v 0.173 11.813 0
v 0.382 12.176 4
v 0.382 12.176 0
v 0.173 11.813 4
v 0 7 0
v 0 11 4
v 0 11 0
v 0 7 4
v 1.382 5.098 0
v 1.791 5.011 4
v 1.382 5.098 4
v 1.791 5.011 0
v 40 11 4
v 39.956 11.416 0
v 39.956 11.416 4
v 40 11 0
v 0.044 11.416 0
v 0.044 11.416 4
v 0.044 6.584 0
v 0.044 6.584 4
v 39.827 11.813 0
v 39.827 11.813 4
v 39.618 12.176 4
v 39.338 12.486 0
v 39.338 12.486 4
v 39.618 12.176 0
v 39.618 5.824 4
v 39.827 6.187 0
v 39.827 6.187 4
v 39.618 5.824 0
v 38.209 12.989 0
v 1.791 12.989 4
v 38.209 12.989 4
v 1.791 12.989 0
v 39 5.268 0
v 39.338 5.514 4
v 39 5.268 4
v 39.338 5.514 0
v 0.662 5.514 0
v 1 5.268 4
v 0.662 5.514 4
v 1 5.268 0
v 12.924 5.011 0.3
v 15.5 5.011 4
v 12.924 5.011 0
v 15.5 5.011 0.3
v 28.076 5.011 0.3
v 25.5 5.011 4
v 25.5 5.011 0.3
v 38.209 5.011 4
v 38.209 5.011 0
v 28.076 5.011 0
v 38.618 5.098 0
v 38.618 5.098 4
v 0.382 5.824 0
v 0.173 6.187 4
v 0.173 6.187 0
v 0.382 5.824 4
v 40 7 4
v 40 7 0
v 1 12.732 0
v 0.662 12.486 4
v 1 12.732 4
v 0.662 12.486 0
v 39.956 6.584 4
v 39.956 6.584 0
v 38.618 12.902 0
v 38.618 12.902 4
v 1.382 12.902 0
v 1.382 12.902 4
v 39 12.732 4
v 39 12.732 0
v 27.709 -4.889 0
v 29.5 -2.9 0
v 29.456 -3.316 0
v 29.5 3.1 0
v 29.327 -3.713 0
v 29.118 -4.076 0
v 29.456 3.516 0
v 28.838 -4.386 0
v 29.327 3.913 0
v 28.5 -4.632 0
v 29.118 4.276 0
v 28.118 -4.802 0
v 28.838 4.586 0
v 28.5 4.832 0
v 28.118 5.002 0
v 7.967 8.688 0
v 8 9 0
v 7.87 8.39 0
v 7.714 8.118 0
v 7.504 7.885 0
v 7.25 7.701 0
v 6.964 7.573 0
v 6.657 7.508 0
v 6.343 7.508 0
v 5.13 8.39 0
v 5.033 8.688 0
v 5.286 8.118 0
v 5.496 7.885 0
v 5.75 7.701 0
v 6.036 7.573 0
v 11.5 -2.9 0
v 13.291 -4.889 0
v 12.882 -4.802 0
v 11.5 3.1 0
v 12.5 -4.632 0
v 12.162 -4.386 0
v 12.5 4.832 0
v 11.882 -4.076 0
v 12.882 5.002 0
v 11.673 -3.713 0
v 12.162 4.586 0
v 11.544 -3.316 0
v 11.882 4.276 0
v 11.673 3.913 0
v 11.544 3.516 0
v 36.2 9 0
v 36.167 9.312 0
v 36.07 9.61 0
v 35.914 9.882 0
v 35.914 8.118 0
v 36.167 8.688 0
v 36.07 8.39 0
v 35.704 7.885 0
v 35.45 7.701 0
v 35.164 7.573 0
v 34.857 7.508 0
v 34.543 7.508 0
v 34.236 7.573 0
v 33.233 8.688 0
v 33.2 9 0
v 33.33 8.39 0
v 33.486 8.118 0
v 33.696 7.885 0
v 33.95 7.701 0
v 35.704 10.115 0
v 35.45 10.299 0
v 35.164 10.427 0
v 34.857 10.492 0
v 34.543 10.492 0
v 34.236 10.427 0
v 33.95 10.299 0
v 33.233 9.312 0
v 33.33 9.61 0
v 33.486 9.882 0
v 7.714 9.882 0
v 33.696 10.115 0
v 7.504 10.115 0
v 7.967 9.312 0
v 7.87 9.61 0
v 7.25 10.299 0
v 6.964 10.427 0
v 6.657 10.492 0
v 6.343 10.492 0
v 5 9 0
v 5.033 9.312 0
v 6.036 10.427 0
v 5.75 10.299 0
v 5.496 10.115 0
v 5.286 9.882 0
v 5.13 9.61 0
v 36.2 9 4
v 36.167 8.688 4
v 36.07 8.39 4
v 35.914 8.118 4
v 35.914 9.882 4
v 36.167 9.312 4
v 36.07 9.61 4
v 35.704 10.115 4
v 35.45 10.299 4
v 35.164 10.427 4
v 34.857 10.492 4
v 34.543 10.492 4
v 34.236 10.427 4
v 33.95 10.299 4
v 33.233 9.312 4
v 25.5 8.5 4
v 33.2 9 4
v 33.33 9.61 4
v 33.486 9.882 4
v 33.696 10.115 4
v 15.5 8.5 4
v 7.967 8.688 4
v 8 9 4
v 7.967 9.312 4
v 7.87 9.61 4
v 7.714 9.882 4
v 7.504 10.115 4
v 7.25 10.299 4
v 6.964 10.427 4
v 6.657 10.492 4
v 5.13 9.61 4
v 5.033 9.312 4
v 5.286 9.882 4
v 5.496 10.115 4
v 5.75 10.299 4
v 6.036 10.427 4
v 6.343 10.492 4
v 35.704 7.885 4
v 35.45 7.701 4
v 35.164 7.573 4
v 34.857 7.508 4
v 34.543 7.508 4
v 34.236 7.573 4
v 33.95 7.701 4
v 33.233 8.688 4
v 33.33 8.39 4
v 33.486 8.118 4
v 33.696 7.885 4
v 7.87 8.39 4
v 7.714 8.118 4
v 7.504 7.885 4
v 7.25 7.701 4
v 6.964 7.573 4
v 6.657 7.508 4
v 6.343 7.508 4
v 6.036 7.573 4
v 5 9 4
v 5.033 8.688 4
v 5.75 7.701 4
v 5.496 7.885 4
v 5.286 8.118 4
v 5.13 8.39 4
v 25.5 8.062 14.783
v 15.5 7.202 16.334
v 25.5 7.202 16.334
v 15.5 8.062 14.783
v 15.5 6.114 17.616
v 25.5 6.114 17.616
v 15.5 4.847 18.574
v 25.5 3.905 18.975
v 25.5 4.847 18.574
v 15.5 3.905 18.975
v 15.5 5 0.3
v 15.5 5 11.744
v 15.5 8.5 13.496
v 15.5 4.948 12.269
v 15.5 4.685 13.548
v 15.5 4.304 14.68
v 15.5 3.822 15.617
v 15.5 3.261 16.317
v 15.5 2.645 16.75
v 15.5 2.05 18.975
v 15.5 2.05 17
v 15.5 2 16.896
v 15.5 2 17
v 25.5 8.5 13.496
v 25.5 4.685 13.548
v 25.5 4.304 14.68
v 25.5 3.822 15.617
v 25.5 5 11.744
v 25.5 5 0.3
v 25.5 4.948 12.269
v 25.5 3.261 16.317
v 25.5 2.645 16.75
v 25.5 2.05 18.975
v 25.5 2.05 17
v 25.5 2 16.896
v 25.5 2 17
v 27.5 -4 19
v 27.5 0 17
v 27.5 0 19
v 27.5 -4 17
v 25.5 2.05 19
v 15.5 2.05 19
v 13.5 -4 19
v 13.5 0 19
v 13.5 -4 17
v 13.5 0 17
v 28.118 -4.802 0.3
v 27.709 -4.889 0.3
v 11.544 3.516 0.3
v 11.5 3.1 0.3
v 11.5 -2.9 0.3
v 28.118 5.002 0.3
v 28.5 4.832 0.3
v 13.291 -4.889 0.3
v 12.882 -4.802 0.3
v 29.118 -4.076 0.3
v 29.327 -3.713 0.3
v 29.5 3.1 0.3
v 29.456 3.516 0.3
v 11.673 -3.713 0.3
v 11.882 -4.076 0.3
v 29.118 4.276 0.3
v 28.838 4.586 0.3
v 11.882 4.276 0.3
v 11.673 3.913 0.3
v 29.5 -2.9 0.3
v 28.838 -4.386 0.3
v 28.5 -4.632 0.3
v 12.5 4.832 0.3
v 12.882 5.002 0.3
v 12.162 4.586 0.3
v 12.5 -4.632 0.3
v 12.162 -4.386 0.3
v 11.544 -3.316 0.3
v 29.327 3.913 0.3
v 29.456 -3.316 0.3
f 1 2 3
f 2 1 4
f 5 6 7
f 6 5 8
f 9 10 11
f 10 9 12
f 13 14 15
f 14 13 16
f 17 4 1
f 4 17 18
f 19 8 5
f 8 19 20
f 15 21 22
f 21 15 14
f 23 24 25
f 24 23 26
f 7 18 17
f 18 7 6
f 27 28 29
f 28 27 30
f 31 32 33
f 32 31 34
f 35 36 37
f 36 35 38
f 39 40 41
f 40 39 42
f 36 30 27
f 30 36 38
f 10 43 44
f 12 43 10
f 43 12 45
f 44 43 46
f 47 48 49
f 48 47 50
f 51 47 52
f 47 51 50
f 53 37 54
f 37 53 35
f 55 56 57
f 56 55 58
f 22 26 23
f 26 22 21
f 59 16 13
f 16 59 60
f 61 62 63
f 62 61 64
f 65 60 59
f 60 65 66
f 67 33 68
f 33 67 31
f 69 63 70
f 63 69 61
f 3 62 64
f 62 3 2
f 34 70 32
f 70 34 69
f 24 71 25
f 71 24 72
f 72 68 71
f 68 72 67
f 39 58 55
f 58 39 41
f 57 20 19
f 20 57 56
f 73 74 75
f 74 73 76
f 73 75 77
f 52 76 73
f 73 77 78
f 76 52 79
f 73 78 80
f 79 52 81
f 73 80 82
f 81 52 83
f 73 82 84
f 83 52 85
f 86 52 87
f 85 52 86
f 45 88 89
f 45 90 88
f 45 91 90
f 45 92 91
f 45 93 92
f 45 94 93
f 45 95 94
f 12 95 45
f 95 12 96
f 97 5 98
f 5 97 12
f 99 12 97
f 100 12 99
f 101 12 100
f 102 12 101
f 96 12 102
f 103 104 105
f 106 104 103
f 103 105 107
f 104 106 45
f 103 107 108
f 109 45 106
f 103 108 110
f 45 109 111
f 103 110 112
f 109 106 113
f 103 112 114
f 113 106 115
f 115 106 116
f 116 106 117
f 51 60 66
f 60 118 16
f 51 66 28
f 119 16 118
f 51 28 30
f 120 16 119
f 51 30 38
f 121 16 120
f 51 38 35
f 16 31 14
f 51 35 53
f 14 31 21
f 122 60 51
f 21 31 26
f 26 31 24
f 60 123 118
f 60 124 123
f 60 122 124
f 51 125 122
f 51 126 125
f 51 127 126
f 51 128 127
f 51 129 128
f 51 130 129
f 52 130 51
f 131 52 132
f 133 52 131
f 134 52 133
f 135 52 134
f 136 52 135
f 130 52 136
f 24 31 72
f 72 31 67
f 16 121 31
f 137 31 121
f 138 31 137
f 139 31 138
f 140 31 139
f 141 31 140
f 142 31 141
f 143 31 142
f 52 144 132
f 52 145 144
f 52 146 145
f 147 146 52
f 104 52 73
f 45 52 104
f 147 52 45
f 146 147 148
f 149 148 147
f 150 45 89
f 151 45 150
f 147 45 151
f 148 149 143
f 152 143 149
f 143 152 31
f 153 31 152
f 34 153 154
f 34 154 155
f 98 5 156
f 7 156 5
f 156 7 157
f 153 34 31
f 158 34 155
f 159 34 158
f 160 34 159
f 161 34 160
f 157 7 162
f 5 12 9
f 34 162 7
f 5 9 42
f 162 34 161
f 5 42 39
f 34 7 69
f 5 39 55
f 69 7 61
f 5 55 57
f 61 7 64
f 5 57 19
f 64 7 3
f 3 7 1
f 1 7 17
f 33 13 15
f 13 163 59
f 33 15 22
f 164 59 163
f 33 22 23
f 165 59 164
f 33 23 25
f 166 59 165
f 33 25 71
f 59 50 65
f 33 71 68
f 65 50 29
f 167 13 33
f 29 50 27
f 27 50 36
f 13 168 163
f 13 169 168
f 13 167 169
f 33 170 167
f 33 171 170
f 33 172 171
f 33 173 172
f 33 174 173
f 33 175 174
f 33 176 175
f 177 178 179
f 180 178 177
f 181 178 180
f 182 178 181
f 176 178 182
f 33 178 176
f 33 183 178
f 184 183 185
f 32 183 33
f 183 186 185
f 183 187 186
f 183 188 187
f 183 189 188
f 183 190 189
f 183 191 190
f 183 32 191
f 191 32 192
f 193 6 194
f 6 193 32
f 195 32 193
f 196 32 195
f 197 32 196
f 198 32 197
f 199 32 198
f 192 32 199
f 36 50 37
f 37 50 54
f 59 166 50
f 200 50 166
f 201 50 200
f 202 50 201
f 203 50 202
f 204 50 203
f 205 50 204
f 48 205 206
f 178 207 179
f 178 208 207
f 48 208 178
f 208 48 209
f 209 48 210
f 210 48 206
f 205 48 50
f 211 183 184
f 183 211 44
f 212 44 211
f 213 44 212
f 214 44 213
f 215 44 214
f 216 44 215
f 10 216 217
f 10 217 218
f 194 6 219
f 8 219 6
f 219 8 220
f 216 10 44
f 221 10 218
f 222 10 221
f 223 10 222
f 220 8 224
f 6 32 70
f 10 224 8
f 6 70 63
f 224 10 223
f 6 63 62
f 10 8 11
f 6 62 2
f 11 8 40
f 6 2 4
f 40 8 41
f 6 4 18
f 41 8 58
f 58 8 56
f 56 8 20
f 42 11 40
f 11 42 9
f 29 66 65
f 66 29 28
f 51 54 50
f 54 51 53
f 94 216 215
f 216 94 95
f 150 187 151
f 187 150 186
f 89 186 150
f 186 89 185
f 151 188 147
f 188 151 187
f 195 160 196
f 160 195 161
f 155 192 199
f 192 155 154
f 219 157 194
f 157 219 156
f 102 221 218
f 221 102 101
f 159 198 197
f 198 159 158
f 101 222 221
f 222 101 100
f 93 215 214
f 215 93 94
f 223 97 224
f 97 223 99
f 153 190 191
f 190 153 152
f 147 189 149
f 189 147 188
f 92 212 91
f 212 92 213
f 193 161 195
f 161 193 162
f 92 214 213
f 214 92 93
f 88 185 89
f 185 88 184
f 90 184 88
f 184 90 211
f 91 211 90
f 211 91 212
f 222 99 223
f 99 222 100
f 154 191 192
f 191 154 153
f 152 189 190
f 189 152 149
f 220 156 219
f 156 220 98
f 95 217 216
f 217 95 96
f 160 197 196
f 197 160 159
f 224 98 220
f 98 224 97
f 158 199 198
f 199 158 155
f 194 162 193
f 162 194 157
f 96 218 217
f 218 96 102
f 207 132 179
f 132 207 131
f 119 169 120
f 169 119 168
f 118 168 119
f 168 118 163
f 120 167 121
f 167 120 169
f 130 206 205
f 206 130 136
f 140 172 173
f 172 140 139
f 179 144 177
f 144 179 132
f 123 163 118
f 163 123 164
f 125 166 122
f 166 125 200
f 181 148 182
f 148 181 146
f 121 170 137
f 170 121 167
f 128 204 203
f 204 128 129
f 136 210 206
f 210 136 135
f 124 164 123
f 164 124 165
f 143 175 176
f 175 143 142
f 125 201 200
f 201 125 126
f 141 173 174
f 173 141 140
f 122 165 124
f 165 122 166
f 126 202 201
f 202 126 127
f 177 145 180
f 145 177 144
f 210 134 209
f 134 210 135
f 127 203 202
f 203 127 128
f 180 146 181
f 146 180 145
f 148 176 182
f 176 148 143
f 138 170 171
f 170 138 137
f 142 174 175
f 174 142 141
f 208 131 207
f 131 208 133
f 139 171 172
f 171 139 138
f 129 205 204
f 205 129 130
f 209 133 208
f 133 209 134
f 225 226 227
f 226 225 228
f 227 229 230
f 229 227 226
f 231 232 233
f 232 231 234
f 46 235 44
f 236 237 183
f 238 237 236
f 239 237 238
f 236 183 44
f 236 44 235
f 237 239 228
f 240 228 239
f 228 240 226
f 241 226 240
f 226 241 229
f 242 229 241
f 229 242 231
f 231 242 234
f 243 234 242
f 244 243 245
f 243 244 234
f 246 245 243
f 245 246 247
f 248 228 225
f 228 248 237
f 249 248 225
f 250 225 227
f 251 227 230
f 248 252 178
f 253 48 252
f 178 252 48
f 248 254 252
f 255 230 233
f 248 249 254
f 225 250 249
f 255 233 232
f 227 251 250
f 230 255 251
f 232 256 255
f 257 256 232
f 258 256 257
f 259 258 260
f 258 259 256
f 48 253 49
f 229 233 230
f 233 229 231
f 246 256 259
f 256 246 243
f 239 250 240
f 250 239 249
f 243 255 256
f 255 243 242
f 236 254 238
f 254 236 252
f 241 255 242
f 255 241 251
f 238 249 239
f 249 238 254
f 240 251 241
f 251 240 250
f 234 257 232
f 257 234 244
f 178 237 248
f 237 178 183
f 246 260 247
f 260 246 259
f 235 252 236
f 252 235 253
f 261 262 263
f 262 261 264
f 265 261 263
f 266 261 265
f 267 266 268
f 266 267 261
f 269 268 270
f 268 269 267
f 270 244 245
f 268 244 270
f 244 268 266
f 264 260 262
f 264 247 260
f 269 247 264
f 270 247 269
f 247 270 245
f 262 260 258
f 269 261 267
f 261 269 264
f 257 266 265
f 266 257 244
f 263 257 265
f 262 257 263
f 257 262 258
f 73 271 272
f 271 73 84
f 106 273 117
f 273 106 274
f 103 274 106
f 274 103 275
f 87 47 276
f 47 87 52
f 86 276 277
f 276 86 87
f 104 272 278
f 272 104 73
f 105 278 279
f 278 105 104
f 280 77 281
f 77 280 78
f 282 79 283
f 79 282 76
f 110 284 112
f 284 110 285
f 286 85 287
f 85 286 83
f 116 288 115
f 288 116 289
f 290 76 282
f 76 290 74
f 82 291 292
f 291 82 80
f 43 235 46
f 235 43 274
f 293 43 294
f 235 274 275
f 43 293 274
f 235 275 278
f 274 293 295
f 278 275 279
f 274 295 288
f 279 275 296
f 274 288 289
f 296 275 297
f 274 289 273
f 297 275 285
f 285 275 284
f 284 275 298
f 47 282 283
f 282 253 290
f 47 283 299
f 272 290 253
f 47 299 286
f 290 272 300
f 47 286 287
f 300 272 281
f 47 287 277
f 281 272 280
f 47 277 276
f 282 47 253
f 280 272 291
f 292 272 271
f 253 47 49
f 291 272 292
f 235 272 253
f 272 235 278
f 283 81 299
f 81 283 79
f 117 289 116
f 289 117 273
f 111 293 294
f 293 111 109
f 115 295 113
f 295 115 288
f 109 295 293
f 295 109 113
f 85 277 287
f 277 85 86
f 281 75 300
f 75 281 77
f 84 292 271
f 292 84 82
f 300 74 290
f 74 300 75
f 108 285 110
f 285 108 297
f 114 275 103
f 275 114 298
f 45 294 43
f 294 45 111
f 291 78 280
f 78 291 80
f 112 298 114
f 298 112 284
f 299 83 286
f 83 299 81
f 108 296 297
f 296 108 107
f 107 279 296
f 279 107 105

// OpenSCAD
// Diameter of Ball
ballSize = 15;

// Oversize for Socket
ballSlop = 1;

// Thickness of socket walls
socketThickness = 1.8;

// Thickness of Flange
flangeThickness = 4;

// Diameter of Flange
flangeDiameter = 40;

// Length of neck extension
neckLength = 10;

flangeMountFactor=.27; // placement for flange holes

$fn=30;

// mountPortion();
// translate([67, 13, 0]) socket();
translate([0,6.0,0]) lensHood();



/* MODULES */

/* CAMERA MOUNT MODULES */
module lensHood(raft=1) {
   protrusionLen = 19;

   /* base */
   difference() {
      translate([0,-1,0]) plate(width=40,height=8);
      translate([6.5,3,-0.1]) cylinder(r=1.5,h=8);
      translate([6.5+28.2,3,-0.1]) cylinder(r=1.5,h=8);
   }

   /* vertical component */
   translate([15.5,-1.0,0]) cube([10,3.5,protrusionLen-7]);

   /* curved section */
   translate([15.5,-4.0,protrusionLen-8.8]) scale([1,1,1.35])
      rotate([0,90,0]) intersection()
      {
         difference() {
            scale([0.97,1,1]) cylinder(r=7,h=10);
            translate([0,0,-0.25]) scale([1.6,1,1]) cylinder(r=3.1,h=10.5);
         }
         translate([-6.5,0,0]) cube([6.5,6.5,10.0]);
      }

   /* hood component (the wide end piece) */
   translate([13.5,-10,protrusionLen-2]) {
      linear_extrude(height=2)
         polygon(points=[[0,0], [0,4], [2,6.05], [12,6.05], [14,4], [14,0]]);
   }

   /* raft */
   if (raft == 1) {
      translate([11.5,-10.9,0]) plate(width=18,height=10,depth=0.3);
   }
}

module mountPortion() {
   translate([0,-1,0]) plate(width=40,height=8);
   translate([0,0,0]) plate(width=5,height=40);
   translate([36,0,0]) plate(width=5,height=40);

   translate([34.65,8.9,0])rotate([0,0,-90]) smallHole();
   translate([6.5,37.1,0]) rotate([0,0,90]) smallHole();
   translate([34.65,37.1,0])rotate([0,0,-90]) smallHole();

   /* add the ball to the mount */
   translate([10,-7,0]) ball();
}

/* smallHole() -- place a hole with surrounding material for screw to
 *                pass through.
 */
module smallHole() {
   difference() {
      union() {
         cylinder(h=4,r=3);
         translate([-3,0,0]) cube([6,3.1,4]);
      }
      translate([0,0,-0.05]) cylinder(h=4.1,r=1.3);
   }
}

/* plate() -- basically just a quick way to make rounded rectangles
 */
module plate(width=35,height=35,depth=4) {
   hull() {
      translate([2,2,0]) cylinder(r=2,h=depth);
      translate([width-2,2,0]) cylinder(r=2,h=depth);
      translate([2,height-2,0]) cylinder(r=2,h=depth);
      translate([width-2,height-2,0]) cylinder(r=2,h=depth);
   }
}

/* holeLocations() -- just a reference for location of holes on camera
*/
module holeLocations() {
   /* locations of holes */
   translate([6.5,8.9,-0.1]) {
      translate([0,0,0]) color("green") cylinder(r=1.2,h=8);
      translate([28.2,0,0]) color("green") cylinder(r=1.2,h=8);
      translate([0,28.2,0]) color("green") cylinder(r=1.2,h=8);
      translate([28.2,28.2,0]) color("green") cylinder(r=1.2,h=8);
   }
}

/* BALL AND SOCKET CODE BELOW */

module ball()
{
   translate([0,0,flangeThickness+neckLength]) sphere(d=ballSize);
   translate([-1*flangeDiameter/4,0,0])
      cube([flangeDiameter/2, flangeDiameter/4, flangeThickness]);

   hull() {
      translate([0,0,flangeThickness/2])
         cylinder (d=flangeDiameter/2,h=flangeThickness,center=true);
      translate([0,0,flangeThickness/2+neckLength-ballSize*.3])
         cylinder(d=ballSize/2,h=.1,center=true);
   }
}

module socket()
{
   difference() {
      union() {
         base();
        
         // outer ball
         translate([0,0,flangeThickness+neckLength-ballSize*.25])
            sphere(d=ballSize+(socketThickness*2));
      }
        
      // cut off top of ball
      translate([0,0,flangeThickness+neckLength])
         cylinder(d=2*ballSize,h=2*ballSize);
        
      // add socket hole
      translate([0,0,flangeThickness+neckLength-ballSize*.25])
         sphere(d=ballSize+ballSlop);
        
      // second sphere to bevel the lip
      translate([0,0,flangeThickness+neckLength+ballSize*.15])
         sphere(d=ballSize+ballSlop);
        
      // add notches for easier insertion
      for (i=[0,90])
         rotate([0,0,i]) translate([0,0,flangeThickness+neckLength])
            cube([socketThickness,
                  ballSize + (socketThickness*2) + .1,
                  allSize*.6], center=true);
        
      // make sure bottom stays flat
      translate([0,0,-flangeDiameter]) cube(flangeDiameter*2,center=true);
   }
}


module base()
{
   difference() {
      union() {
         // flange base
         translate([0,0,flangeThickness/2])cylinder (d=flangeDiameter,h=flangeThickness,center=true);
            
         // neck
         hull() {
            translate([0,0,flangeThickness/2])cylinder (d=flangeDiameter/2,h=flangeThickness,center=true);
            translate([0,0,flangeThickness/2+neckLength-ballSize*.3]) cylinder(d=ballSize/2,h=.1,center=true);
         }
      }
        
      // flange holes
      for (i=[-1,1],j=[-1,1]) {
         translate ([i*(flangeDiameter*flangeMountFactor),j*(flangeDiameter*flangeMountFactor),-.1])
             std1032BoltHole();
       }
   }
}

// Approach taken from MCAD.
//
// Modified for #10-32 machine screw and nut
//   http://www.smithfast.com/msthreaddims.html
//   http://www.mcfeelys.com/tech/dimensions.htm
//
module std1032BoltHole(length=30, tolerance = +0.0001)
{
    radius = 4.78/2 + tolerance; // listed tolerance is .0028 in
    //capHeight = (.097 * 25.4) + tolerance;
    capHeight = 4.82 + tolerance;
    capRadius = 7.82/2 + tolerance;

    translate([0, 0, -capHeight+tolerance]) cylinder(r= capRadius, h=capHeight);
    cylinder(r = radius, h = length);
}
